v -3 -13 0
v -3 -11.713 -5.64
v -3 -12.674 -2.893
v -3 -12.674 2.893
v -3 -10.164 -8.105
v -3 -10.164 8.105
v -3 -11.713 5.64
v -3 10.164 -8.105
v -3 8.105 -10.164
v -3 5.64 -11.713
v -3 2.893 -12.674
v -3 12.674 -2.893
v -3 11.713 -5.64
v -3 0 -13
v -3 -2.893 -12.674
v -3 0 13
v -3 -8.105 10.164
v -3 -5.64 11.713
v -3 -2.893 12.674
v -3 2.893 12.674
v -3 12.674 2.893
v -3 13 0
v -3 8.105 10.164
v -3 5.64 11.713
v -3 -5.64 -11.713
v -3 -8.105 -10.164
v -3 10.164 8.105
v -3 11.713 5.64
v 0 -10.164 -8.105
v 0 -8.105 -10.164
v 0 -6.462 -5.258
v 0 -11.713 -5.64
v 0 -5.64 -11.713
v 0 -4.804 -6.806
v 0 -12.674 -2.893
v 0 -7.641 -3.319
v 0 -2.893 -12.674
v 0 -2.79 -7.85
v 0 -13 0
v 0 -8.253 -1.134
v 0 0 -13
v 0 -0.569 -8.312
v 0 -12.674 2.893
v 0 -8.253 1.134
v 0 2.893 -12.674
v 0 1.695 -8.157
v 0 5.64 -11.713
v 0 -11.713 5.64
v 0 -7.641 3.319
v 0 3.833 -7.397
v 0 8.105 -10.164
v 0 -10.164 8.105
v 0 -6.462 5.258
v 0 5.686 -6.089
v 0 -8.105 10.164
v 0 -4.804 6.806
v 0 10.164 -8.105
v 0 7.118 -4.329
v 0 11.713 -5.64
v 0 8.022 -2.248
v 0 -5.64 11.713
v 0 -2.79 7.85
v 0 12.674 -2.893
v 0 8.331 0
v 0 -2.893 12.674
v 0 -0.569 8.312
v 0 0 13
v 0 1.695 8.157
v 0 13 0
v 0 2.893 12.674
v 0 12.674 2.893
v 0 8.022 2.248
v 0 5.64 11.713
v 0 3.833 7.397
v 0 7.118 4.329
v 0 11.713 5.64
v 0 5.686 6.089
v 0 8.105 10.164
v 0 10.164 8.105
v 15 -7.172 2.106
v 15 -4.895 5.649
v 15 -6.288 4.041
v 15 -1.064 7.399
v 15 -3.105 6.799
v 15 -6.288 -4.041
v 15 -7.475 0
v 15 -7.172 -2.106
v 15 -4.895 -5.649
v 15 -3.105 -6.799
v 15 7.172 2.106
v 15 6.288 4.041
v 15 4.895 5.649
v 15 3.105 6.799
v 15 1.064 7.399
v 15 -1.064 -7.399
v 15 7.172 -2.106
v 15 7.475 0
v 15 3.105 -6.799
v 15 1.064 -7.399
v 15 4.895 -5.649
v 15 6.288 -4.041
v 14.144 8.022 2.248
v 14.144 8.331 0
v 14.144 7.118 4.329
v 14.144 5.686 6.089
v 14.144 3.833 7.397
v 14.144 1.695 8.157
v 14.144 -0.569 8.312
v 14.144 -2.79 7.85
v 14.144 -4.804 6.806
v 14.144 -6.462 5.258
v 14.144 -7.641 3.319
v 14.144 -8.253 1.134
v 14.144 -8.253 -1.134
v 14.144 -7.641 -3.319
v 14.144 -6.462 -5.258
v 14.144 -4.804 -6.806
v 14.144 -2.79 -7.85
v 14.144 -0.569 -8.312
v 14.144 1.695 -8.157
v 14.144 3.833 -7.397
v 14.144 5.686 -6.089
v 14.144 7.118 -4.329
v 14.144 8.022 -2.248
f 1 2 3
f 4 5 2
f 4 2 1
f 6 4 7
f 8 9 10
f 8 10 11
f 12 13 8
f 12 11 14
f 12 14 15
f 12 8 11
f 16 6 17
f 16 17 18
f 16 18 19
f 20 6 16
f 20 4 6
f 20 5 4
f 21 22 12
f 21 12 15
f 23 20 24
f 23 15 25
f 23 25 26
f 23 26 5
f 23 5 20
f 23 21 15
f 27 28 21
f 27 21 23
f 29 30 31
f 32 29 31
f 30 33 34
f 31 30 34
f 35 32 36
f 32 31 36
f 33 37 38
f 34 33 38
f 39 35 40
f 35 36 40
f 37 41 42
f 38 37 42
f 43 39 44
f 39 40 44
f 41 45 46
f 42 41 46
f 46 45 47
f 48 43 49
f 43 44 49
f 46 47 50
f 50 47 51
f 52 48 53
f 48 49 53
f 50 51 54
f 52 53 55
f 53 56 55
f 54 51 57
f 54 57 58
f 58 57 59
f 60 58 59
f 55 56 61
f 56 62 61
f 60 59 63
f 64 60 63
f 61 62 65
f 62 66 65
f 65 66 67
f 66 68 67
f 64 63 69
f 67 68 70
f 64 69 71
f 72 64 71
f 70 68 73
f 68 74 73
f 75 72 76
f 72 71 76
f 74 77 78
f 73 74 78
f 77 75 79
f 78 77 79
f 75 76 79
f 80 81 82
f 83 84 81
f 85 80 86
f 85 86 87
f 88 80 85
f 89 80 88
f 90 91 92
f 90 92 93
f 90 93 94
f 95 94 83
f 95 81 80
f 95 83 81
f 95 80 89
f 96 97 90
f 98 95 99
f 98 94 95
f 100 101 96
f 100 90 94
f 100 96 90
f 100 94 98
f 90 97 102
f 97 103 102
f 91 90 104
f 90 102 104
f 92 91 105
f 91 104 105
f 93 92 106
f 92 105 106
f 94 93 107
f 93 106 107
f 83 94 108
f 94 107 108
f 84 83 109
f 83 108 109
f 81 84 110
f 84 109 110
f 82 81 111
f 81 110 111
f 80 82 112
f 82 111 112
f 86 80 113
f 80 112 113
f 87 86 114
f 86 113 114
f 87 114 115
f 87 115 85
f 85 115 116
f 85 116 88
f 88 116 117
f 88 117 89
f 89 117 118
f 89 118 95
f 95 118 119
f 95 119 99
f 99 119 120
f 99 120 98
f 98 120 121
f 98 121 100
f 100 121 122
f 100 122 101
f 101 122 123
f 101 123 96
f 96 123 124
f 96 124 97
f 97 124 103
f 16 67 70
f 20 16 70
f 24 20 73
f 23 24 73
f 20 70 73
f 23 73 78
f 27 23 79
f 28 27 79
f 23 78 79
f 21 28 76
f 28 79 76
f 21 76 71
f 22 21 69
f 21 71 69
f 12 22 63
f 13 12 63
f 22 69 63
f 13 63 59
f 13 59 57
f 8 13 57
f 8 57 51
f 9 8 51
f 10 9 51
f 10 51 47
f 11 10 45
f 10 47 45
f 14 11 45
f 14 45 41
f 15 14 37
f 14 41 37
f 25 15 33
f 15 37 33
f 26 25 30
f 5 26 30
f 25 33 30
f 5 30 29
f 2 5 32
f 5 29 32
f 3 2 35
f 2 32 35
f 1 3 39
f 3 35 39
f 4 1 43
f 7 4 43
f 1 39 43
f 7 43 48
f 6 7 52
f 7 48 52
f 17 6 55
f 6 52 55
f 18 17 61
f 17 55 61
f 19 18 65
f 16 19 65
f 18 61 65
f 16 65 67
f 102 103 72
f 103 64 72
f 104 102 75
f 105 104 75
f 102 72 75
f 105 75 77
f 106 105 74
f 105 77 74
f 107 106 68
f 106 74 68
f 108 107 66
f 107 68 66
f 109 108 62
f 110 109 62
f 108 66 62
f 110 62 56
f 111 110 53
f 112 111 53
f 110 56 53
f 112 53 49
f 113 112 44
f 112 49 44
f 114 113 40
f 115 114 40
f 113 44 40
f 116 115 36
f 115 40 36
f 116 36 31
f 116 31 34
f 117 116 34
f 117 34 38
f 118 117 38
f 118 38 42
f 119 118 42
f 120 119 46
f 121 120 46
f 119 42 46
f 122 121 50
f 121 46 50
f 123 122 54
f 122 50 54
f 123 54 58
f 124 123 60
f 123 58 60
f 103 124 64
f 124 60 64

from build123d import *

# Parameters (mm, degrees)
SKETCH1_R           = 10
BOSS_EXTRUDE1_DEPTH = 15
SKETCH2_R           = 13
BOSS_EXTRUDE2_DEPTH = 3


# Read off the part's stored shape, not the designer's step: G3/8 Straight Pipe Tapped Thread Stud1
with BuildPart() as part:
    # Sketch1 → Boss-Extrude1 (new body)
    with BuildSketch(Plane(origin=(0, 0, 0), x_dir=(0, 0, -1), z_dir=(1, 0, 0))):
        Circle(SKETCH1_R)
    extrude(amount=BOSS_EXTRUDE1_DEPTH)

    # Sketch2 → Boss-Extrude2 (add)
    with BuildSketch(Plane.ZY):
        Circle(SKETCH2_R)
    extrude(amount=BOSS_EXTRUDE2_DEPTH)

    # G3/8 Straight Pipe Tapped Thread Stud1 o → G3/8 Straight Pipe Tapped Thread Stud1 (revolve, cut)
    with BuildSketch(Plane.YX):
        Polygon((10, 15), (7.475, 15), (8.331, 14.144), (8.331, 0), (10, 0), align=None)
    revolve(axis=Axis((0, 0, 0), (1, 0, 0)), mode=Mode.SUBTRACT)


solid = part.part
